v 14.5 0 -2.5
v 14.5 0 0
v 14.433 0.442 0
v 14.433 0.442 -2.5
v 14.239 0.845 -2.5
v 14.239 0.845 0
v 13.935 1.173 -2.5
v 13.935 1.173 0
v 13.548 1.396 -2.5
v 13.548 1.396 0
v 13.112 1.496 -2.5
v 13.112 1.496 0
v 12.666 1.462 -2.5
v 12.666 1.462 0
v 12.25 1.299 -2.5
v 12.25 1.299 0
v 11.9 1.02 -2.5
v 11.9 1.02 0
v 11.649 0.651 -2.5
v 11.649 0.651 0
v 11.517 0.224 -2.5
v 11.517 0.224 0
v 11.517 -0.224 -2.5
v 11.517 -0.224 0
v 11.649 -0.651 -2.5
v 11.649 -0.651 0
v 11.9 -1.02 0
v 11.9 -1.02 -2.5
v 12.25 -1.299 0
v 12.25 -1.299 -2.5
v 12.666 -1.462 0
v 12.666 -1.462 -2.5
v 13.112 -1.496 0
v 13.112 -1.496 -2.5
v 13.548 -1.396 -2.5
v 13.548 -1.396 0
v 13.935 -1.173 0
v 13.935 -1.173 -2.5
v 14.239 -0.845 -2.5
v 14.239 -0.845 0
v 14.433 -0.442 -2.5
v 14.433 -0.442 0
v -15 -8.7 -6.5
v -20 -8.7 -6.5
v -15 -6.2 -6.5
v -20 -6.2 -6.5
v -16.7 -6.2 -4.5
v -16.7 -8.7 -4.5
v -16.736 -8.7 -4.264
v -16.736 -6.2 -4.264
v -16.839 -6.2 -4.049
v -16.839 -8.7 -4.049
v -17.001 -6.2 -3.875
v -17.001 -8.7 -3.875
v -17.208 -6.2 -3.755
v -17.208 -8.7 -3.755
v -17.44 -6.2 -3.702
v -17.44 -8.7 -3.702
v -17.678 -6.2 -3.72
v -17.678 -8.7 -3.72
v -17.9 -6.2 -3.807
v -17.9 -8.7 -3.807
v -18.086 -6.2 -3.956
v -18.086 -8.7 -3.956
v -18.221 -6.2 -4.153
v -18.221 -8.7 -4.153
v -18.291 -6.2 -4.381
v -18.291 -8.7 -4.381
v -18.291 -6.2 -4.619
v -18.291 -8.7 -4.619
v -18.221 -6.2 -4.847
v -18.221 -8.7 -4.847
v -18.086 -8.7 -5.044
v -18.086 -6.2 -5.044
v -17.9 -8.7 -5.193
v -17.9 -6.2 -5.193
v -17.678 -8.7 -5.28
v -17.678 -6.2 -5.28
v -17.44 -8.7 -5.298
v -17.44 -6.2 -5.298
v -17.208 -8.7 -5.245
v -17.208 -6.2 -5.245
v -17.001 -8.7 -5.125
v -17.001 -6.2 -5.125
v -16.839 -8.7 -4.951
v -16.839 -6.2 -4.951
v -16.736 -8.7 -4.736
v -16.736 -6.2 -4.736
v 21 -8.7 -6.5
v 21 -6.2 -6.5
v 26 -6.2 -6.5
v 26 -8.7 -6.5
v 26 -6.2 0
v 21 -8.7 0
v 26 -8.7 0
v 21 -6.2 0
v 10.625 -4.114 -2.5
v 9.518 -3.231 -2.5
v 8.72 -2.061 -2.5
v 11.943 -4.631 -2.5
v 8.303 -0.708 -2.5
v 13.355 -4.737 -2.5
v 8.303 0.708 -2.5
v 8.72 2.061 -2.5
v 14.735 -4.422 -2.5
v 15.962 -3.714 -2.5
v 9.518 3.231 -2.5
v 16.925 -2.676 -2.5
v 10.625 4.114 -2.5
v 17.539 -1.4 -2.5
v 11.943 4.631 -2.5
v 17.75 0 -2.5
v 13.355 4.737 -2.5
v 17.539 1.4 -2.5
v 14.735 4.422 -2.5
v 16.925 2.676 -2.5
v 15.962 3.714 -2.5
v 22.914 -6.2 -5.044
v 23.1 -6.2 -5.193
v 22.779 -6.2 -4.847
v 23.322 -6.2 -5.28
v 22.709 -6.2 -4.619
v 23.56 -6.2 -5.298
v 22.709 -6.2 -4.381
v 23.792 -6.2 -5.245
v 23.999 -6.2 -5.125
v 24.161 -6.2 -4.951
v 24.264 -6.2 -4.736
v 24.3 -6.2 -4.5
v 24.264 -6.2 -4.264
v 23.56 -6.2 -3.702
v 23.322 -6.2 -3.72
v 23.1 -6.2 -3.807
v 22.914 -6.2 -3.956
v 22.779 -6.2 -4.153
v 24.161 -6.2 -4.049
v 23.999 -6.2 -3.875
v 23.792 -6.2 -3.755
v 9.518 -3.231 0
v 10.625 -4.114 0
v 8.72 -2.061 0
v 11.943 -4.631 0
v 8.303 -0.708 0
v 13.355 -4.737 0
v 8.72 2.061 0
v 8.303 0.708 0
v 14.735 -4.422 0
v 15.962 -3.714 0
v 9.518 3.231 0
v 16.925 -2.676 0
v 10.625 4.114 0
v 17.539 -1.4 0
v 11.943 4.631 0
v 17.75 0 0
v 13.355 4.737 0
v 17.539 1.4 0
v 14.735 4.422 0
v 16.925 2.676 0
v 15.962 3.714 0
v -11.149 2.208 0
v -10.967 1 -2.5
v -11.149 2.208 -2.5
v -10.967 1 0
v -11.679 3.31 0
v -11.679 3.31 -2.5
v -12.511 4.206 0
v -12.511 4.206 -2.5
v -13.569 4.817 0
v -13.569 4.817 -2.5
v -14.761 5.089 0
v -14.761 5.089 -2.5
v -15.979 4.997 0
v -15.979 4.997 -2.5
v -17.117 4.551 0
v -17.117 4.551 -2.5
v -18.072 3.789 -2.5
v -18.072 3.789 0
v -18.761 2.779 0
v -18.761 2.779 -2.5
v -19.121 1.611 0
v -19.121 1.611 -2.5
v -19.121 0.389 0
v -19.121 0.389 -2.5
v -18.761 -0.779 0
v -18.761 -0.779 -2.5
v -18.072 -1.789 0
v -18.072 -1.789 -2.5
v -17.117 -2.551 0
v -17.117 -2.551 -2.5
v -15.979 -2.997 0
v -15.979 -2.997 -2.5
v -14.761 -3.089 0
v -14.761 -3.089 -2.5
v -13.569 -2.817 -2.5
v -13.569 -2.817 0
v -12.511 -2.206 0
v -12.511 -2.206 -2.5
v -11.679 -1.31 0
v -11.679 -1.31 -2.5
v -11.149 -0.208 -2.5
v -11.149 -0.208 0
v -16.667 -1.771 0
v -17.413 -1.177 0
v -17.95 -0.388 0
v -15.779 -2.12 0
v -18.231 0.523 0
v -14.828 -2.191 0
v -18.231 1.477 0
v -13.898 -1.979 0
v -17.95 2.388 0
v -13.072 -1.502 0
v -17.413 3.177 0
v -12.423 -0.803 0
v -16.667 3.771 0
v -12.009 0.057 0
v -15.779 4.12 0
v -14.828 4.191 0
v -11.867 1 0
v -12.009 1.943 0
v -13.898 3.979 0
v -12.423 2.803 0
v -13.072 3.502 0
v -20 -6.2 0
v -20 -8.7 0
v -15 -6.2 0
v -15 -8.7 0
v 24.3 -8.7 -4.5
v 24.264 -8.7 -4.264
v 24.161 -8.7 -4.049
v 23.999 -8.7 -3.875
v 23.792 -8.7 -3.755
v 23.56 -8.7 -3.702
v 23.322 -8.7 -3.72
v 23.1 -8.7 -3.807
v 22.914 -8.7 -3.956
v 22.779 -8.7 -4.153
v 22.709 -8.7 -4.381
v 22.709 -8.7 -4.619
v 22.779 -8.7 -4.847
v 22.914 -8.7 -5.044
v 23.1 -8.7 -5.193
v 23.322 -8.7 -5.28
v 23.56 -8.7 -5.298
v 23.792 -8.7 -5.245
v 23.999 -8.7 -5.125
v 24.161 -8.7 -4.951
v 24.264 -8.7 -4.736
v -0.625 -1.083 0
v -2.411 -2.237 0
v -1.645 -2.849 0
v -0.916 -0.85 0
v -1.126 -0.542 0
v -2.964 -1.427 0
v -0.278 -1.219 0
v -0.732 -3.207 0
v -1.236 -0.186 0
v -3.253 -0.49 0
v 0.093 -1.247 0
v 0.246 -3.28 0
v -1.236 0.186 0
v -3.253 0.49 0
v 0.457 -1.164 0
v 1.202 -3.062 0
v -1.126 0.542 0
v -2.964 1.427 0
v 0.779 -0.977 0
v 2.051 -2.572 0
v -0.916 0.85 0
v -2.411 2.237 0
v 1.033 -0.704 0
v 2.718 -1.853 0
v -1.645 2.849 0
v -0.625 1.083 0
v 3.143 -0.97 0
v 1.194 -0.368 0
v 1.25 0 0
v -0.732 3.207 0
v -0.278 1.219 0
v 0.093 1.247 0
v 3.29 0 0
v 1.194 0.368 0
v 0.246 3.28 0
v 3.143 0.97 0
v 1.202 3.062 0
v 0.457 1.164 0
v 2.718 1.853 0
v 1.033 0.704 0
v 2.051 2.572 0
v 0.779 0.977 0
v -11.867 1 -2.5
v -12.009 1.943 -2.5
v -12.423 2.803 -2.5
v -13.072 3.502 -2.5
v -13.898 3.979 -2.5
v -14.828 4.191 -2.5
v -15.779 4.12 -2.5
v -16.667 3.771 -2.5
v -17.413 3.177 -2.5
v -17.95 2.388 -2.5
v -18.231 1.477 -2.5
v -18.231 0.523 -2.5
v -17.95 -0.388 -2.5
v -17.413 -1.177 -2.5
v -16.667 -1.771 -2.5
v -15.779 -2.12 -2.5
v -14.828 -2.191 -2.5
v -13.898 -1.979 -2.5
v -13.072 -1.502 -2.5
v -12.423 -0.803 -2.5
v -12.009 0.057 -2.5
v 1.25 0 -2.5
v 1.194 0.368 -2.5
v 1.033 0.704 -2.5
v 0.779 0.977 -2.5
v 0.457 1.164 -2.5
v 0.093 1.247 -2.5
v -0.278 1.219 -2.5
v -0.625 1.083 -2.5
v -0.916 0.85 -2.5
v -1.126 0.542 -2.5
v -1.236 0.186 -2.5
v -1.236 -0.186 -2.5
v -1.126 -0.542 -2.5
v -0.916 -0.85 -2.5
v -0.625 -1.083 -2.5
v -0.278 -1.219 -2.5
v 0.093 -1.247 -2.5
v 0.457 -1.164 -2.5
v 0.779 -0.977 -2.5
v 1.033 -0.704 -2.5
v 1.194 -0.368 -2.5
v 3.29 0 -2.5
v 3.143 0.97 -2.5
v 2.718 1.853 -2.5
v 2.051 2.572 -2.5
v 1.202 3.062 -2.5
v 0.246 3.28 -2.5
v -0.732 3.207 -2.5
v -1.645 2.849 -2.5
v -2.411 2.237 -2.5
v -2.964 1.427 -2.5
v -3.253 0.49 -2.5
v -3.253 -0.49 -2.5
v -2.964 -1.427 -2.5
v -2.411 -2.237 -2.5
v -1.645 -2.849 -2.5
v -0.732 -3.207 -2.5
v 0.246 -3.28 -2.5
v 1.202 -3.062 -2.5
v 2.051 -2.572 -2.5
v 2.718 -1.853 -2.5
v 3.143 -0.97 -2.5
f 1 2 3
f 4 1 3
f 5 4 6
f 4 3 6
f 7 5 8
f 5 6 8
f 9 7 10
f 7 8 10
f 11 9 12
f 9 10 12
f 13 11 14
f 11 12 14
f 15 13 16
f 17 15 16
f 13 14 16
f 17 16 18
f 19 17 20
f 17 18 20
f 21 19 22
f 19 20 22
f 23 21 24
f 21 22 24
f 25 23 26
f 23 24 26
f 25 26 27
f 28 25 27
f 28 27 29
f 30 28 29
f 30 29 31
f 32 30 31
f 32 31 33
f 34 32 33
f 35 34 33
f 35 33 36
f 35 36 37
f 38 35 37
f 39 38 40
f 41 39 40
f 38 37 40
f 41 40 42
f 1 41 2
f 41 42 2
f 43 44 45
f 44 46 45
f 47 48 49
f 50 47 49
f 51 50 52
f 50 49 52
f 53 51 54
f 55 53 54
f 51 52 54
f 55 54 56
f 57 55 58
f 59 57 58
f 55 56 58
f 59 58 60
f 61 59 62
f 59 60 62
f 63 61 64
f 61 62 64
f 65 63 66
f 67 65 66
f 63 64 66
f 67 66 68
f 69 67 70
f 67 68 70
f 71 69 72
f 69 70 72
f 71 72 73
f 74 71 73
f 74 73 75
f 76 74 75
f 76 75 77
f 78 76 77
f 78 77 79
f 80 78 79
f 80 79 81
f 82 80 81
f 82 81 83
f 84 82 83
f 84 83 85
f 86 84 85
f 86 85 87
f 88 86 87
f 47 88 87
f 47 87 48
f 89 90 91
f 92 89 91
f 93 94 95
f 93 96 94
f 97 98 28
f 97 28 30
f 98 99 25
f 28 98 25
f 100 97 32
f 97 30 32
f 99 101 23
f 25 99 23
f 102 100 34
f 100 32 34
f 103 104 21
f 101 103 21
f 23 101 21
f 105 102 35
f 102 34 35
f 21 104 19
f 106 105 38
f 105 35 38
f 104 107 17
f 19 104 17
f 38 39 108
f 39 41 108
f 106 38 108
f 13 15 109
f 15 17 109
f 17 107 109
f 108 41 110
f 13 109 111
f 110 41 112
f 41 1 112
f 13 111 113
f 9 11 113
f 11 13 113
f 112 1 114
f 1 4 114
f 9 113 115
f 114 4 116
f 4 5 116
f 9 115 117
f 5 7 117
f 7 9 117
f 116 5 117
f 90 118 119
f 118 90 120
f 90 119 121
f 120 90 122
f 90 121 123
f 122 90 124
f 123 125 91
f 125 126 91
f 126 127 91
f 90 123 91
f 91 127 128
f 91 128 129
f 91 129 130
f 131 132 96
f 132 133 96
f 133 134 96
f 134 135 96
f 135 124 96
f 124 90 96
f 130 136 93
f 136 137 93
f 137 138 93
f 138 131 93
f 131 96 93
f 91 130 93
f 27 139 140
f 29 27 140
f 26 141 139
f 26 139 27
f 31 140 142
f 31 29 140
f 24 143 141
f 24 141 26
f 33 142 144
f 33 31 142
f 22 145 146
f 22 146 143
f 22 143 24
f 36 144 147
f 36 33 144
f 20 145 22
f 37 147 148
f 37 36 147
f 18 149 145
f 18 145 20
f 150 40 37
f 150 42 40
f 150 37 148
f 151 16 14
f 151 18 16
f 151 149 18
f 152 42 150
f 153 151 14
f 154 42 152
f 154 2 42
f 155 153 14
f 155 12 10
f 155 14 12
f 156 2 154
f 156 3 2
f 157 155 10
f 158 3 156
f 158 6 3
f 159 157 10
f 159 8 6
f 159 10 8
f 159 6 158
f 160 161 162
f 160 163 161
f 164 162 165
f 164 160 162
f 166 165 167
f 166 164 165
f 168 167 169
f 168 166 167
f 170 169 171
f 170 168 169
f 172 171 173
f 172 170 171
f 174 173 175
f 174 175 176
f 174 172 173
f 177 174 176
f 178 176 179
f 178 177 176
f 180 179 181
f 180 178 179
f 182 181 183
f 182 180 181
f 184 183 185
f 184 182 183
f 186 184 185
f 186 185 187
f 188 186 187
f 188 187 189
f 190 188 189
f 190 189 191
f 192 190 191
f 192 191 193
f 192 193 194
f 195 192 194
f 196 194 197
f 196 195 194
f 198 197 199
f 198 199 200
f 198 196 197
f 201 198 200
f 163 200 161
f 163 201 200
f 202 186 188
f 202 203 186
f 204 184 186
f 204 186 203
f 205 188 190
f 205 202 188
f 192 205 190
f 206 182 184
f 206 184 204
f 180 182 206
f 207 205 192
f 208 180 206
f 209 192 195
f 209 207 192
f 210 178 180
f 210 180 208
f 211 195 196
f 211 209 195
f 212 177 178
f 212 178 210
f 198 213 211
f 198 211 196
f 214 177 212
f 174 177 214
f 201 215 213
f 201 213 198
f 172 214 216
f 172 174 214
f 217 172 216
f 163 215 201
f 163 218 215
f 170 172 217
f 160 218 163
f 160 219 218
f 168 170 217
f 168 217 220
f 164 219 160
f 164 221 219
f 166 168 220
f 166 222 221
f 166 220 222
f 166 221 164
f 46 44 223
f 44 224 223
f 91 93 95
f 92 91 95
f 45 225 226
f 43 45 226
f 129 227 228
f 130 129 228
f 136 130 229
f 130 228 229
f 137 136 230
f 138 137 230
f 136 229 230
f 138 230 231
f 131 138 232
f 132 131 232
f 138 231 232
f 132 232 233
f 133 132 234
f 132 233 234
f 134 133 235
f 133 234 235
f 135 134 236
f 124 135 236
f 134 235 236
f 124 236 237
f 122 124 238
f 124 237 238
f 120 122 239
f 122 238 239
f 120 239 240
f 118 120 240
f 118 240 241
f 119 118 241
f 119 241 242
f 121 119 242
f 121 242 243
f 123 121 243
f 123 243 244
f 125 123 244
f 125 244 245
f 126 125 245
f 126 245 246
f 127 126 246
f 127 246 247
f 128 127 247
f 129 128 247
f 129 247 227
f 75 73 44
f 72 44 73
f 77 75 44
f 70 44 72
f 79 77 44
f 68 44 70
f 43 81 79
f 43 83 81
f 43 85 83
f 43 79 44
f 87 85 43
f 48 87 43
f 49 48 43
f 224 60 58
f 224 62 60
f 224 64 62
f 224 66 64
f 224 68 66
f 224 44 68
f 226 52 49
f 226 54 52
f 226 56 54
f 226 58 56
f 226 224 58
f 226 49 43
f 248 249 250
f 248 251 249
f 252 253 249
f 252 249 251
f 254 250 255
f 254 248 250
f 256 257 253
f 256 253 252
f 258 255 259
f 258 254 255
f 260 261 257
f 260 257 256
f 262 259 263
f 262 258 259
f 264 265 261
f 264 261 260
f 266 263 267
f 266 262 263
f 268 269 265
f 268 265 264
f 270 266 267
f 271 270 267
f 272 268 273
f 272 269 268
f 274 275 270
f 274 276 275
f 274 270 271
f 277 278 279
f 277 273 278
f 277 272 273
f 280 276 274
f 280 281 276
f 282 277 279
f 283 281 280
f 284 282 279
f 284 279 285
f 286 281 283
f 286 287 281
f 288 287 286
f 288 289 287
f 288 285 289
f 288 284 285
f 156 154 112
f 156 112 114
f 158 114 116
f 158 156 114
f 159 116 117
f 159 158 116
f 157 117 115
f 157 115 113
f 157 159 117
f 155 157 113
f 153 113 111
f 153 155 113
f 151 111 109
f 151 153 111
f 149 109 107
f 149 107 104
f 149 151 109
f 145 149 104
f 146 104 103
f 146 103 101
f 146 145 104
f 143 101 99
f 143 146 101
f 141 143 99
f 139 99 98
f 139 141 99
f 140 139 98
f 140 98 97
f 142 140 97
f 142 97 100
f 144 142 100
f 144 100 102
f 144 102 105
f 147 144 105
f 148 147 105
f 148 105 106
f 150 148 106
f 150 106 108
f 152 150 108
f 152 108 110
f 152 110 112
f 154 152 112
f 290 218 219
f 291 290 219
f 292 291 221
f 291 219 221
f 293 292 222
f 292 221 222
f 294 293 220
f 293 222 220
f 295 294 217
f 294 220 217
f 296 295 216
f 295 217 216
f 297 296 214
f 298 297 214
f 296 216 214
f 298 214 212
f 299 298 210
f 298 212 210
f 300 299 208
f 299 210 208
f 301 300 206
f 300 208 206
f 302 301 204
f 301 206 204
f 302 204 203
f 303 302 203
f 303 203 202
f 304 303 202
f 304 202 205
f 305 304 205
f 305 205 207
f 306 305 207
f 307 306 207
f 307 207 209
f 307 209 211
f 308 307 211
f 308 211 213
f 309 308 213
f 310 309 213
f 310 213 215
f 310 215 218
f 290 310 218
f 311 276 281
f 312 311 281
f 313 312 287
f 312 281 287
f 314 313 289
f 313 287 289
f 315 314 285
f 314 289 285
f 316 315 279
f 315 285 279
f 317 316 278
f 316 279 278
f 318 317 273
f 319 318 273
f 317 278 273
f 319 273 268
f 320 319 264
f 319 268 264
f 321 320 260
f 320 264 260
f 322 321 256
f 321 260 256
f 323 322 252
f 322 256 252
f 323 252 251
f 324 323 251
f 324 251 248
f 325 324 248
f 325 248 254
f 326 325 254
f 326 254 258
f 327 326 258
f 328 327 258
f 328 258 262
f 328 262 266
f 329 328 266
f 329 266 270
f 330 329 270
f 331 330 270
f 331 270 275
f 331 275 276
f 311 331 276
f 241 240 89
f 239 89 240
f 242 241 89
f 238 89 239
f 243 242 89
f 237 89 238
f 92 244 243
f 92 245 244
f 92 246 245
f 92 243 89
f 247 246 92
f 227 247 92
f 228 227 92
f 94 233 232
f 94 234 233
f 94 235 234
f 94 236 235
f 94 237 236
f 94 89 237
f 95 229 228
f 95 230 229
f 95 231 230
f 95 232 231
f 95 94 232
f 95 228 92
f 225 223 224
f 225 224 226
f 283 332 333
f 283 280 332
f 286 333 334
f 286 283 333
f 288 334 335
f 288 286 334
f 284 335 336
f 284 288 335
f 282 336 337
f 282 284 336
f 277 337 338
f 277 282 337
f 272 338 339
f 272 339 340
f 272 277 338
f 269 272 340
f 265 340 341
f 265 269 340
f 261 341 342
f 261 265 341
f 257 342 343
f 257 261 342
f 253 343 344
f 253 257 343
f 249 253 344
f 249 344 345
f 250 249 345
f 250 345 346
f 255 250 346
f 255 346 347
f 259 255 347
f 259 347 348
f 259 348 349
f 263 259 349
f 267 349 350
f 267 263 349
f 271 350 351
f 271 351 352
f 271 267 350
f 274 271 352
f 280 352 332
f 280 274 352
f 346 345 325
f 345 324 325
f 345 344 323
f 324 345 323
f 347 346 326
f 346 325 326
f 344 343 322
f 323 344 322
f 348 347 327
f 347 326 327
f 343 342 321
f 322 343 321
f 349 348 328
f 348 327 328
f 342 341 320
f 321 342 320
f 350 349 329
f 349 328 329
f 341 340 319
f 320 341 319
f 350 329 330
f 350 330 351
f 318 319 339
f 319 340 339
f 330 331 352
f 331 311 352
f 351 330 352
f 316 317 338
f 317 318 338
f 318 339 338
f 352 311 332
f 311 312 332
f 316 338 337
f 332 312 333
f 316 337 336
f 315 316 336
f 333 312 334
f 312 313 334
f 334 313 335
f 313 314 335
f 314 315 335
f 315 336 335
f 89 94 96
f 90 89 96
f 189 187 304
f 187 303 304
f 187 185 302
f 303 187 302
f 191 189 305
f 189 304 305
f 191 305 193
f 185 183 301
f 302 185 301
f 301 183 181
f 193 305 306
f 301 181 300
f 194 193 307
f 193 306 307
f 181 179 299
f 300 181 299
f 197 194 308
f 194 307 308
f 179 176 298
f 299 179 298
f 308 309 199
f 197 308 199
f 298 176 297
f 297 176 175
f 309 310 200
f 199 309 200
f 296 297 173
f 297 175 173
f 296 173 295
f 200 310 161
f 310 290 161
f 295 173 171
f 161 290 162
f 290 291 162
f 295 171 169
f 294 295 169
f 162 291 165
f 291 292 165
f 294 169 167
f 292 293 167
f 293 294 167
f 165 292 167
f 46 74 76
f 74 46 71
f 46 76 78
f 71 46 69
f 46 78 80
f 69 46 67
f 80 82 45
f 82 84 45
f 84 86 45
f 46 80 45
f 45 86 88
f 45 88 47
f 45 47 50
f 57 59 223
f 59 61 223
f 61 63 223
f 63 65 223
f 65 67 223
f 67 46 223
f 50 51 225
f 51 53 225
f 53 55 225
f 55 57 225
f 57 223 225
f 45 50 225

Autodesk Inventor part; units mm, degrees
ref_plane "YZ Plane" through (0, 0, 0) normal (1, 0, 0) x (0, 1, 0)
ref_plane "XZ Plane" through (0, 0, 0) normal (0, 1, 0) x (-1, 0, 0)
ref_plane "XY Plane" through (0, 0, 0) normal (0, 0, 1) x (1, 0, 0)
sketch "スケッチ1" plane through (0, 0, 0) normal (0, 0, 1) x (1, 0, 0)
  circle A0 centre (0, 0) radius 10.65 construction
  line L0 (0, 0) -> (0, 1) construction
  line L1 (0, 0) -> (1, 0) construction
  circle A1 centre (13, 0) radius 2.25 construction
  circle A2 centre (-15.0669, 1) radius 4.35 construction
  circle A3 centre (0, 0) radius 11.5 construction
  line L2 (-25, -11.5) -> (25, -11.5) construction
  line L3 (-25, -9.7) -> (25, -9.7) construction
  line L4 (-25, -8.7) -> (25, -8.7) construction
  dimension "d0" = 1
  dimension "d2" = 1
  dimension "d3" = 21.3
  dimension "d5" = 4.5
  dimension "d6" = 0.1
  dimension "d7" = 8.7
  dimension "d8" = 0.1
  dimension "d9" = 23
  dimension "d10" = 50
  dimension "d11" = 1.8
  dimension "d12" = 1
  dimension "d46" = 12.5
  dimension "d47" = 11.5
sketch "スケッチ2" plane through (0, 0, 0) normal (0, 0, 1) x (1, 0, 0)
  circle A0 centre (-15.0669, 1) radius 4.35 construction
  line L0 (0, 0) -> (0, 1) construction
  circle A1 centre (0, 0) radius 10.65 construction
  circle A2 centre (0, 0) radius 11.5 construction
  line L1 (-25, -8.7) -> (25, -8.7) construction
  line L2 (-25, -9.7) -> (25, -9.7) construction
  line L3 (-25, -11.5) -> (25, -11.5) construction
  line L4 (0, 0) -> (1, 0) construction
  circle A3 centre (13, 0) radius 2.25 construction
  circle A4 centre (13, 0) radius 4.25 construction
  circle A5 centre (-15.0669, 1) radius 3.6 construction
  circle A6 centre (-15.0669, 1) radius 3 construction
  circle A7 centre (0, 0) radius 1.25 construction
  circle A8 centre (0, 0) radius 1.5 construction
  dimension "d13" = 8.5
  dimension "d14" = 7.2
  dimension "d15" = 6
  dimension "d27" = 2.5
  dimension "d28" = 3
sketch "スケッチ3" plane through (0, 0, 0) normal (0, 0, 1) x (1, 0, 0)
  circle A0 centre (-15.0669, 1) radius 4.35 construction
  line L0 (0, 0) -> (0, 1) construction
  line L1 (0, 0) -> (1, 0) construction
  line L2 (-25, -11.5) -> (25, -11.5) construction
  line L3 (-25, -9.7) -> (25, -9.7) construction
  line L4 (-25, -8.7) -> (25, -8.7) construction
  circle A1 centre (13, 0) radius 2.25 construction
  circle A2 centre (0, 0) radius 10.65 construction
  circle A3 centre (0, 0) radius 11.5 construction
  circle A4 centre (-15.0669, 1) radius 4.35 construction
  line L5 (0, 0) -> (0, 1) construction
  circle A5 centre (0, 0) radius 10.65 construction
  circle A6 centre (0, 0) radius 11.5 construction
  line L6 (-25, -8.7) -> (25, -8.7) construction
  line L7 (-25, -9.7) -> (25, -9.7) construction
  line L8 (-25, -11.5) -> (25, -11.5) construction
  line L9 (0, 0) -> (1, 0) construction
  circle A7 centre (13, 0) radius 2.25 construction
  circle A8 centre (13, 0) radius 4.25 construction
  circle A9 centre (-15.0669, 1) radius 3.6 construction
  circle A10 centre (-15.0669, 1) radius 3 construction
  line L10 (-20, -6.2) -> (-15, -6.2)
  line L11 (-15, -6.2) -> (-15, -8.7)
  line L12 (-20, -8.7) -> (-20, -6.2)
  line L13 (21, -6.2) -> (26, -6.2)
  line L14 (26, -6.2) -> (26, -8.7)
  line L15 (21, -8.7) -> (21, -6.2)
  line L16 (-20, -6.2) -> (-15, -8.7) construction
  line L17 (-20, -8.7) -> (-15, -6.2) construction
  line L18 (21, -6.2) -> (26, -8.7) construction
  line L19 (21, -8.7) -> (26, -6.2) construction
  line L20 (-20, -8.7) -> (-15, -8.7)
  line L21 (21, -8.7) -> (26, -8.7)
  circle A11 centre (-15.0669, 1) radius 3.2
  circle A12 centre (-15.0669, 1) radius 4.1
  circle A13 centre (13, 0) radius 4.75
  circle A14 centre (0, 0) radius 3.2895
  circle A15 centre (0, 0) radius 1.25 projected
  circle A16 centre (13, 0) radius 1.5
  point P0 (-17.5, -7.45)
  point P1 (23.5, -7.45)
  point P2 (15.3415, -6)
  point P3 (15, -6.1912)
  dimension "d17" = 5
  dimension "d18" = 5
  dimension "d19" = 2.5
  dimension "d20" = 2.5
  dimension "d22" = 20
  dimension "d23" = 26
  dimension "d24" = 0.2
  dimension "d25" = 0.5
  dimension "d26" = 0.5
  dimension "d31" = 3
  dimension "d39" = 41
extrude "押し出し1" add sketch "スケッチ3" against normal blind 6.5 contours L10 L11 L20 L12 | L13 L14 L21 L15
extrude "押し出し2" add sketch "スケッチ3" against normal blind 2.5 contours A12 | A13 | A14
ref_plane "作業平面1" through (21, -8.7, 0) normal (0, -1, 0) x (1, 0, 0)
sketch "スケッチ4" plane through (21, -8.7, 0) normal (0, -1, 0) x (1, 0, 0)
  line L0 (0, 0) -> (5, 0) projected
  line L1 (0, 0) -> (0, -6.5) projected
  line L2 (5, -6.5) -> (0, -6.5) projected
  line L3 (5, 0) -> (5, -6.5) projected
  line L4 (-41, 0) -> (-36, 0) projected
  line L5 (-41, 0) -> (-41, -6.5) projected
  line L6 (-36, -6.5) -> (-41, -6.5) projected
  line L7 (-36, 0) -> (-36, -6.5) projected
  line L8 (5, 0) -> (0, 0) projected
  line L9 (0, 0) -> (0, -6.5) projected
  line L10 (5, 0) -> (5, -6.5) projected
  line L11 (-41, 0) -> (-36, 0) projected
  circle A0 centre (2.5, -4.5) radius 0.8
  circle A1 centre (-38.5, -4.5) radius 0.8
  line L12 (-41, 0) -> (-41, -6.5) projected
  line L13 (-41, -2.5) -> (-36, -2.5)
  line L14 (0, -2.5) -> (5, -2.5)
  line L15 (-41, -2.5) -> (-36, -6.5) construction
  line L16 (-36, -6.5) -> (-41, -6.5) projected
  line L17 (-41, -6.5) -> (-36, -2.5) construction
  line L18 (0, -6.5) -> (5, -6.5) projected
  line L19 (0, -2.5) -> (5, -6.5) construction
  line L20 (0, -6.5) -> (5, -2.5) construction
  point P0 (-21, 0)
  dimension "d35" = 1.6
  dimension "d36" = 1.6
  dimension "d44" = 2.5
  dimension "d45" = 2.5
extrude "押し出し3" cut sketch "スケッチ4" against normal up to surface (2.5 mm away) contours A0 | A1
equation "\"d2\" = d0"
equation "\"d36\" = d35"
properties part number "motormount"
